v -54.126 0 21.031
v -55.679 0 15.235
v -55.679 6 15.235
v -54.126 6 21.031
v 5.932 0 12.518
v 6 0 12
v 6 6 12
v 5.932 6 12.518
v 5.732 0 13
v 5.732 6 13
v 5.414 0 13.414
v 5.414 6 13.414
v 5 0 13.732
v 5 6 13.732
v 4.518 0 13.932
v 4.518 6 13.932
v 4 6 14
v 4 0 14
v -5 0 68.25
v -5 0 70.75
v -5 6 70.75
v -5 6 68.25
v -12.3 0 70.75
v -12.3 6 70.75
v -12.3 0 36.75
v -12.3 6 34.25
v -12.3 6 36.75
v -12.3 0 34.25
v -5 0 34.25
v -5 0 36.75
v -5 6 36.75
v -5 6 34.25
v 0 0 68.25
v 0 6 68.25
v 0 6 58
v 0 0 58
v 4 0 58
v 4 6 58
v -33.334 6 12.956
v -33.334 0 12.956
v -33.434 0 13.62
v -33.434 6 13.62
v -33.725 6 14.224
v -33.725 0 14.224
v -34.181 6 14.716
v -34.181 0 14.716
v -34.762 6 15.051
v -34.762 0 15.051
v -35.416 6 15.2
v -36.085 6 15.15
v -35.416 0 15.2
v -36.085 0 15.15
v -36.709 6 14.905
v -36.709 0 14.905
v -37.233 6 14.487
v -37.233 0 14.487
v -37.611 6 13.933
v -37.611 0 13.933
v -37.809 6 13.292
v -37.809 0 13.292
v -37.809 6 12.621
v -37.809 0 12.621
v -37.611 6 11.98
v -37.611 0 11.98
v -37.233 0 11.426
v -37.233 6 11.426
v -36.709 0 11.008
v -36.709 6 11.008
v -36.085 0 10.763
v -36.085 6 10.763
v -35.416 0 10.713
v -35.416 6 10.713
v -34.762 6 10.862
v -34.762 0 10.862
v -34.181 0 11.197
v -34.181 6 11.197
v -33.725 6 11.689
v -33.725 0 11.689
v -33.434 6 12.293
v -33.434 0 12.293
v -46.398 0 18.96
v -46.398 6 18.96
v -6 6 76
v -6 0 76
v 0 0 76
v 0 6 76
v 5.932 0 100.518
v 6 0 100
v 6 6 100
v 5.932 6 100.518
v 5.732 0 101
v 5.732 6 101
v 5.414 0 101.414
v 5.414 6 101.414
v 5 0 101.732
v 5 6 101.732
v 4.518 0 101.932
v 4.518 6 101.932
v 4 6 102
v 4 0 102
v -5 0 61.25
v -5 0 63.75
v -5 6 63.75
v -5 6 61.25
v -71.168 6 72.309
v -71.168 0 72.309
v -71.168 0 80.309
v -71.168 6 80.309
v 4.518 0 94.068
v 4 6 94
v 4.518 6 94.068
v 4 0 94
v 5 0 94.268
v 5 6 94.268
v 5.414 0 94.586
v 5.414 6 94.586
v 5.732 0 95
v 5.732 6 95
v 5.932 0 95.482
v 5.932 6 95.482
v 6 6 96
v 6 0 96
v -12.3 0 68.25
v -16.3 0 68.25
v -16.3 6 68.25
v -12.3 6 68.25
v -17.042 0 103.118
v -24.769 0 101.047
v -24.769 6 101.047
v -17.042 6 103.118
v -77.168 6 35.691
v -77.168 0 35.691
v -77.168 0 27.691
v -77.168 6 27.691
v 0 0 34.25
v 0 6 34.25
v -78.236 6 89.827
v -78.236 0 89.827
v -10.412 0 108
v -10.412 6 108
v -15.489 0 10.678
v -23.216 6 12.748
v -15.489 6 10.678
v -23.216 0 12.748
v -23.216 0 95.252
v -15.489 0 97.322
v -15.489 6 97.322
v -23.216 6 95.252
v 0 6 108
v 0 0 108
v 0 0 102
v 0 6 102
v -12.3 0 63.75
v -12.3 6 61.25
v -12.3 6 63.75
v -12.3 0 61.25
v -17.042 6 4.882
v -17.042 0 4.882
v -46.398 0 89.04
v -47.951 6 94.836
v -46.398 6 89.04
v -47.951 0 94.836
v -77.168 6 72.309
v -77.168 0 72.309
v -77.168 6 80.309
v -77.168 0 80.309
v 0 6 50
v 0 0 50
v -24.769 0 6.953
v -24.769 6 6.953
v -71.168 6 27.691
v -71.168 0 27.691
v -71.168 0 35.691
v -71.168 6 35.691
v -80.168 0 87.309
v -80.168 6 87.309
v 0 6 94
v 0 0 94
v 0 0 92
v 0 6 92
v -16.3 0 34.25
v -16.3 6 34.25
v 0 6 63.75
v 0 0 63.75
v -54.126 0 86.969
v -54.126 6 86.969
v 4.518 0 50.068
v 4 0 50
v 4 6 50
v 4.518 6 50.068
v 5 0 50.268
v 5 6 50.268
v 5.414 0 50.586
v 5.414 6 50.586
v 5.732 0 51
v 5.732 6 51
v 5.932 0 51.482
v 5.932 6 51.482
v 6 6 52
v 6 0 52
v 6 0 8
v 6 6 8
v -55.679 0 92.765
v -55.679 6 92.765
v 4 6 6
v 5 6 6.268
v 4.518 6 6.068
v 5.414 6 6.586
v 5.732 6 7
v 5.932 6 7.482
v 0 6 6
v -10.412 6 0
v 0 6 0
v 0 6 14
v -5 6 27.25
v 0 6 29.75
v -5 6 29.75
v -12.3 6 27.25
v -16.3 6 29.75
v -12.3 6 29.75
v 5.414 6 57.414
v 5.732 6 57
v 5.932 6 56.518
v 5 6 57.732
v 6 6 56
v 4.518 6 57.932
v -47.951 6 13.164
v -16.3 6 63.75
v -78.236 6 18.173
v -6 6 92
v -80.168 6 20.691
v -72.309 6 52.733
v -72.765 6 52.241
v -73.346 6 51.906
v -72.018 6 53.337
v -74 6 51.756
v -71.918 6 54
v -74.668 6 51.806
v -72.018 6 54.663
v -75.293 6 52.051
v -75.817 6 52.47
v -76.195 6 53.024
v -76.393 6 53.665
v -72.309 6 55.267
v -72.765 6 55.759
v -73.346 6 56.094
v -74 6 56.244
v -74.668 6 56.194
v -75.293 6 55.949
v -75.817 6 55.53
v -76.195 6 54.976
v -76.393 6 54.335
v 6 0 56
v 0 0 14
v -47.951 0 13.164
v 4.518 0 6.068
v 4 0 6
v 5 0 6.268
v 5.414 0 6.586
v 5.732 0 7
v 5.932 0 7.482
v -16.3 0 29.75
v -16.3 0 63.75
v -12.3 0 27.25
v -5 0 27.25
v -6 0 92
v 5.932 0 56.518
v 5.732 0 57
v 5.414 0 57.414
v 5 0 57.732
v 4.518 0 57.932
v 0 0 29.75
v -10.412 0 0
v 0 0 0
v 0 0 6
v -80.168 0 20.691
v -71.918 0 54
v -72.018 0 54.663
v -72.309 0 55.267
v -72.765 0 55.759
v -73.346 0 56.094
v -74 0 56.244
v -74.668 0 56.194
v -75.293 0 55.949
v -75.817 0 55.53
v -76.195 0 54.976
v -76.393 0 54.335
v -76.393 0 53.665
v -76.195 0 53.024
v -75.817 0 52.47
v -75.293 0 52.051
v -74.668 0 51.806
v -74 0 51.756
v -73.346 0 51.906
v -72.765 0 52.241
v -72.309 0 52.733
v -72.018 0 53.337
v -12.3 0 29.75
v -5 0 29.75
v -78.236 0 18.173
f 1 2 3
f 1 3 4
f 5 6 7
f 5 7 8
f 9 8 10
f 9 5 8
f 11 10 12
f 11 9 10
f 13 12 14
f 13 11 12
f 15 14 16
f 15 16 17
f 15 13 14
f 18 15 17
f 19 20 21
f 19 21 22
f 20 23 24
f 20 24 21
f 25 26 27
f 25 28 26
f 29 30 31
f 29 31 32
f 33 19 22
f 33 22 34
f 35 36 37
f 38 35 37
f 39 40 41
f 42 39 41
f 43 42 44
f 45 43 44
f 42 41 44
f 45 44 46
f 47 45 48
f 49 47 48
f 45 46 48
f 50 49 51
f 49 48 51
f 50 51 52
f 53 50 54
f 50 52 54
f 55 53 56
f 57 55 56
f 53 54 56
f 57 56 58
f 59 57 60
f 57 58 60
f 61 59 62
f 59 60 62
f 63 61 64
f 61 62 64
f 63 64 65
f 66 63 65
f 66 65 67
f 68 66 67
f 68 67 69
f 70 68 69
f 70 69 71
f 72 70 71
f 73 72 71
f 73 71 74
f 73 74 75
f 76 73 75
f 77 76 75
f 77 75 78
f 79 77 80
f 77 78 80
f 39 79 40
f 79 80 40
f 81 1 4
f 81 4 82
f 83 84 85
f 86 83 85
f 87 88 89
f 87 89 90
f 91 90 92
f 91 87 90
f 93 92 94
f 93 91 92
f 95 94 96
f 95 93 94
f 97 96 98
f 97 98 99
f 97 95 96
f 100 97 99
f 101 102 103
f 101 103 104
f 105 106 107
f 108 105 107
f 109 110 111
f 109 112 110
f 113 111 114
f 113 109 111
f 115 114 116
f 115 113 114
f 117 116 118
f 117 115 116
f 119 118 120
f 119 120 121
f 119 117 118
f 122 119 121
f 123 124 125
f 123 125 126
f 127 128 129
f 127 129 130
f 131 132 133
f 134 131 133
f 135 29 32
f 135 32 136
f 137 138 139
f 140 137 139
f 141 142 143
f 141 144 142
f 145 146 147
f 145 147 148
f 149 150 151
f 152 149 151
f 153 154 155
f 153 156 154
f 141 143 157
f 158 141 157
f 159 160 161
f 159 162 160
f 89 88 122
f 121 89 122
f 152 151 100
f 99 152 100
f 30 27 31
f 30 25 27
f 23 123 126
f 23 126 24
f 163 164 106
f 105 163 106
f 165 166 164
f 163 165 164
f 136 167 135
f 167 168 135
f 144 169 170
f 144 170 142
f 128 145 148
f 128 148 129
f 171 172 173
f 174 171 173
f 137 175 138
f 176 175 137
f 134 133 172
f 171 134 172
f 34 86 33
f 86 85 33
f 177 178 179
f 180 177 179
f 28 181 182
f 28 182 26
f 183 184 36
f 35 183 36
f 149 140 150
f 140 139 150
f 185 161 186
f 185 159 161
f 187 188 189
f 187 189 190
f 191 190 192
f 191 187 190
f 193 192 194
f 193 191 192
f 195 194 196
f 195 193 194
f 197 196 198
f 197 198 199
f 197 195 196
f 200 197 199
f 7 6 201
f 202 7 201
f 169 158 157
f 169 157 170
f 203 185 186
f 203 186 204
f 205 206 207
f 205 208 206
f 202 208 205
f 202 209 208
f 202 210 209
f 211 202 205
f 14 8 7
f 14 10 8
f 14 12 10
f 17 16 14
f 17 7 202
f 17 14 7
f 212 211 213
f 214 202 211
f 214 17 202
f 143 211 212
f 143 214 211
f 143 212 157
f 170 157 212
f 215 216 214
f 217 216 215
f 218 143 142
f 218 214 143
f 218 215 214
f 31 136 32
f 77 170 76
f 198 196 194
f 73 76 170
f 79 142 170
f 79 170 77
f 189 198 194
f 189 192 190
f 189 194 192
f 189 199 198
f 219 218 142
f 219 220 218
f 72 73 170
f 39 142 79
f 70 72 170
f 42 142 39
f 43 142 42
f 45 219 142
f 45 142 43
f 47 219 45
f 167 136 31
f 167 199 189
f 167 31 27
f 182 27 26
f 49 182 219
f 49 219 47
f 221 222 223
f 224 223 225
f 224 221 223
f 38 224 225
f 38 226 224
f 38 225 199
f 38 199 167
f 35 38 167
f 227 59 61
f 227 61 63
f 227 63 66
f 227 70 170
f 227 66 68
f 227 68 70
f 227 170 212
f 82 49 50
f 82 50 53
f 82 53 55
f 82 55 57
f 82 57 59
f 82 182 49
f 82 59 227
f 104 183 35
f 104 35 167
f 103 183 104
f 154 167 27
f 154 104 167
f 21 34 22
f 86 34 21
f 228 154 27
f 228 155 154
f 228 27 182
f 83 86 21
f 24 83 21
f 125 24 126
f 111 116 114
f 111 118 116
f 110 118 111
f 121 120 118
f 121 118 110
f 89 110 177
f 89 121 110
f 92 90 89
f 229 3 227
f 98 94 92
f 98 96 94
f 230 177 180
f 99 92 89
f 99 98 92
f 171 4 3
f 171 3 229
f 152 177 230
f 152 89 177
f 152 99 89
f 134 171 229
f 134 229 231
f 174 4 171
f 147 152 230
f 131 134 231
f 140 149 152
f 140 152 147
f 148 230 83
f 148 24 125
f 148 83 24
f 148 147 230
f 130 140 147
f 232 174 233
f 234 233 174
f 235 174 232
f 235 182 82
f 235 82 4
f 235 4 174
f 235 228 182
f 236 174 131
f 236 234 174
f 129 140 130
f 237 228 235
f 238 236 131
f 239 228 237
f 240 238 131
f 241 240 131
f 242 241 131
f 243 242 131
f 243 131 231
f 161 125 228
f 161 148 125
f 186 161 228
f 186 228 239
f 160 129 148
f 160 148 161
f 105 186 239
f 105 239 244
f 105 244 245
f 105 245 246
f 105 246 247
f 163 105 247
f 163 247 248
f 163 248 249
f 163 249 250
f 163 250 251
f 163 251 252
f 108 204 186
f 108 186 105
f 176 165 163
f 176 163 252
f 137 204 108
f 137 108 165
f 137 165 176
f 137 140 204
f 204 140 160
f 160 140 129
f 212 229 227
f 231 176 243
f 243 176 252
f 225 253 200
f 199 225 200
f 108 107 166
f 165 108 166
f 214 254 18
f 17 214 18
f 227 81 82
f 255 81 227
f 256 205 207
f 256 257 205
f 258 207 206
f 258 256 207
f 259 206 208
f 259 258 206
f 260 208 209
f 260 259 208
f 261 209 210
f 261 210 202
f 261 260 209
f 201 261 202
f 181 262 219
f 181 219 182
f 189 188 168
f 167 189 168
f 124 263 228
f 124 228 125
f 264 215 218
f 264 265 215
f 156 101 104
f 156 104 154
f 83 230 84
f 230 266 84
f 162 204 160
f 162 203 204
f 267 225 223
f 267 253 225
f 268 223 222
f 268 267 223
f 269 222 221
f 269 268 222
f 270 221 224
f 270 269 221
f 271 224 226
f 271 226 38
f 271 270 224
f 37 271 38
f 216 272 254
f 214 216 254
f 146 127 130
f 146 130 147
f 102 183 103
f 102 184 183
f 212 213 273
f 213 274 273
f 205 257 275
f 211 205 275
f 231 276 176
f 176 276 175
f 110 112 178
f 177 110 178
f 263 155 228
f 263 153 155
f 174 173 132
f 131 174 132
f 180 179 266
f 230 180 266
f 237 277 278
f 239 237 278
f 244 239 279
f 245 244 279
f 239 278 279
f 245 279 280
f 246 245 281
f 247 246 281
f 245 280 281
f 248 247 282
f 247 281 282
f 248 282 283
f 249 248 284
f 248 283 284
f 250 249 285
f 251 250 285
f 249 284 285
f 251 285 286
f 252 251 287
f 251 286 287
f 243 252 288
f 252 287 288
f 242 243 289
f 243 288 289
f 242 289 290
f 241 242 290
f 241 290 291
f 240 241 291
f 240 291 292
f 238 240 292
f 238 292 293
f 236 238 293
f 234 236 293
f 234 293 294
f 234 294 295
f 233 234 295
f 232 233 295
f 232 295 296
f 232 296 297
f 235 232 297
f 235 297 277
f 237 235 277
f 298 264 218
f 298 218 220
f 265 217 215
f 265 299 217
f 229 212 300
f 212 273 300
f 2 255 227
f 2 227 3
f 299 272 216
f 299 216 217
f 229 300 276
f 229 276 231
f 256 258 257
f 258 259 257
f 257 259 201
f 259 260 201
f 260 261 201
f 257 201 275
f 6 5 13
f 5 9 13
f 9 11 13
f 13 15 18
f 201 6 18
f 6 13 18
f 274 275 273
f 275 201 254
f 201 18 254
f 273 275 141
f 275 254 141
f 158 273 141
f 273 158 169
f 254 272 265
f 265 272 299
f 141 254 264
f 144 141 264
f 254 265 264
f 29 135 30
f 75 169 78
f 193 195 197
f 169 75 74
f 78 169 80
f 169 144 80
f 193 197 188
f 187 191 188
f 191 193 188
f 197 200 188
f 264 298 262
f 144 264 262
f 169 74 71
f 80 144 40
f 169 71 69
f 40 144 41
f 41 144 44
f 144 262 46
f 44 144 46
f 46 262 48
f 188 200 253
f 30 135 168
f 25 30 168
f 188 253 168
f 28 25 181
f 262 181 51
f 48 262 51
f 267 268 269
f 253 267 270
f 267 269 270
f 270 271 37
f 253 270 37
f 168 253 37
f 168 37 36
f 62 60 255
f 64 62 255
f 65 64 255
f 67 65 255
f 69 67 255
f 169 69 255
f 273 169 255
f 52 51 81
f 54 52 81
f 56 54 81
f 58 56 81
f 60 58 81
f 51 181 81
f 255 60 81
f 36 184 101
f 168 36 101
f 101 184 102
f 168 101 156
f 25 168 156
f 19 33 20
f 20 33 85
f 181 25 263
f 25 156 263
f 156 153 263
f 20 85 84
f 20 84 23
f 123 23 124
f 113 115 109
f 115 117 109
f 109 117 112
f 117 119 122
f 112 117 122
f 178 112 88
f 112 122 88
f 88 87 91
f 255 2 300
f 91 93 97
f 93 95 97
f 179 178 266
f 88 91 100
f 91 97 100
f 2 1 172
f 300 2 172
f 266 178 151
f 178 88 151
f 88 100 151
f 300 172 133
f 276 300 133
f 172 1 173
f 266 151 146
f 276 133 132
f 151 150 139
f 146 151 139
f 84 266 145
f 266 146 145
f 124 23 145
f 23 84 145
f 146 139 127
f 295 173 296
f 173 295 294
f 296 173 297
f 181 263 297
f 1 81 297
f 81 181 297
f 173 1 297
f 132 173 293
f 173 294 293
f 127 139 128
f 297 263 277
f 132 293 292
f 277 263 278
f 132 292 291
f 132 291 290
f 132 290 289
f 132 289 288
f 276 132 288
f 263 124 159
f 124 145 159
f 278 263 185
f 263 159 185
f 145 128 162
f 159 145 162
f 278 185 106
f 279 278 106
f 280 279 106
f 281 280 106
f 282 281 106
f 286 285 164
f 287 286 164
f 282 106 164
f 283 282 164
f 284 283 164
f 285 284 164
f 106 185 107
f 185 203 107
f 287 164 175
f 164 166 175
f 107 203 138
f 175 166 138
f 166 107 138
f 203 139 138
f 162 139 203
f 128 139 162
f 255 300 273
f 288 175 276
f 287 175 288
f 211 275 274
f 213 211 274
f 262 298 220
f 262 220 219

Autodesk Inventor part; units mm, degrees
ref_plane "YZ Plane" through (0, 0, 0) normal (1, 0, 0) x (0, 1, 0)
ref_plane "XZ Plane" through (0, 0, 0) normal (0, 1, 0) x (-1, 0, 0)
ref_plane "XY Plane" through (0, 0, 0) normal (0, 0, 1) x (1, 0, 0)
sketch "Sketch1" plane through (0, 0, 0) normal (0, 1, 0) x (-1, 0, 0)
  line L0 (0, 108) -> (0, 0)
  line L1 (0, 0) -> (10.412, 0)
  line L2 (10.412, 0) -> (80.1677, 18.691)
  line L3 (80.1677, 18.691) -> (80.1677, 89.309)
  line L4 (80.1677, 89.309) -> (10.412, 108)
  line L5 (10.412, 108) -> (0, 108)
  line L6 (2.5529, 107) -> (1, 101.2044) construction
  line L7 (1, 101.2044) -> (68.6148, 83.0871) construction
  line L8 (68.6148, 83.0871) -> (70.1677, 88.8827) construction
  line L9 (70.1677, 88.8827) -> (2.5529, 107) construction
  line L10 (1, 6.7956) -> (2.5529, 1) construction
  line L11 (2.5529, 1) -> (70.1677, 19.1173) construction
  line L12 (70.1677, 19.1173) -> (68.6148, 24.9129) construction
  line L13 (68.6148, 24.9129) -> (1, 6.7956) construction
  line L14 (71.1677, 88.309) -> (77.1677, 88.309) construction
  line L15 (77.1677, 88.309) -> (77.1677, 19.691) construction
  line L16 (77.1677, 19.691) -> (71.1677, 19.691) construction
  line L17 (71.1677, 19.691) -> (71.1677, 88.309) construction
  line L18 (17.0418, 103.1177) -> (15.4889, 97.3222)
  line L19 (15.4889, 97.3222) -> (23.2163, 95.2516)
  line L20 (23.2163, 95.2516) -> (24.7692, 101.0472)
  line L21 (24.7692, 101.0472) -> (17.0418, 103.1177)
  line L22 (47.9514, 94.8355) -> (46.3985, 89.0399)
  line L23 (46.3985, 89.0399) -> (54.1259, 86.9694)
  line L24 (54.1259, 86.9694) -> (55.6788, 92.765)
  line L25 (55.6788, 92.765) -> (47.9514, 94.8355)
  line L26 (15.4889, 10.6778) -> (17.0418, 4.8823)
  line L27 (17.0418, 4.8823) -> (24.7692, 6.9528)
  line L28 (24.7692, 6.9528) -> (23.2163, 12.7484)
  line L29 (23.2163, 12.7484) -> (15.4889, 10.6778)
  line L30 (46.3985, 18.9601) -> (47.9514, 13.1645)
  line L31 (47.9514, 13.1645) -> (55.6788, 15.235)
  line L32 (55.6788, 15.235) -> (54.1259, 21.0306)
  line L33 (54.1259, 21.0306) -> (46.3985, 18.9601)
  line L34 (54.9024, 89.8672) -> (69.3913, 85.9849) construction
  line L35 (16.2653, 7.7801) -> (1.7765, 3.8978) construction
  line L36 (54.9024, 18.1328) -> (69.3913, 22.0151) construction
  line L37 (16.2653, 100.2199) -> (1.7765, 104.1022) construction
  line L38 (71.1677, 80.309) -> (77.1677, 80.309)
  line L39 (77.1677, 80.309) -> (77.1677, 72.309)
  line L40 (77.1677, 72.309) -> (71.1677, 72.309)
  line L41 (71.1677, 72.309) -> (71.1677, 80.309)
  line L42 (71.1677, 35.691) -> (77.1677, 35.691)
  line L43 (77.1677, 35.691) -> (77.1677, 27.691)
  line L44 (77.1677, 27.691) -> (71.1677, 27.691)
  line L45 (71.1677, 27.691) -> (71.1677, 35.691)
  line L46 (74.1677, 80.309) -> (74.1677, 88.309) construction
  line L47 (74.1677, 27.691) -> (74.1677, 19.691) construction
  dimension "d0" = 70
  dimension "d1" = 6
  dimension "d3" = 70
  dimension "d4" = 6
  dimension "d7" = 3
  dimension "d8" = 3
  dimension "d9" = 6
  dimension "d10" = 3
  dimension "d11" = 1
  dimension "d12" = 1
  dimension "d13" = 1
  dimension "d14" = 1
  dimension "d15" = 15
  dimension "d16" = 1
  dimension "d17" = 1
  dimension "d18" = 1
  dimension "d19" = 108
  dimension "d20" = 8
  dimension "d21" = 15
  dimension "d22" = 8
extrude "Extrusion7" add sketch "Sketch1" along normal blind 6
sketch "Sketch7" plane through (0, 0, 0) normal (0, -1, 0) x (1, 0, 0)
  line L0 (0, 0) -> (0, 108) projected
  line L1 (0, 92) -> (-6, 92)
  line L2 (-6, 92) -> (-6, 76)
  line L3 (-6, 76) -> (0, 76)
  line L4 (0, 76) -> (0, 92)
  dimension "d74" = 16
  dimension "d75" = 16
  dimension "d76" = 6
extrude "Extrusion8" cut sketch "Sketch7" against normal blind 6
sketch "Sketch8" plane through (0, 0, 0) normal (0, -1, 0) x (1, 0, 0)
  line L0 (-77.1677, 72.309) -> (-71.1677, 35.691) construction
  line L1 (-77.1677, 35.691) -> (-71.1677, 72.309) construction
  circle A0 centre (-74.1677, 54) radius 2.25
  dimension "d80" = 4.5
extrude "Extrusion9" cut sketch "Sketch8" against normal blind 6
sketch "Sketch9" plane through (0, 0, 0) normal (0, -1, 0) x (1, 0, 0)
  line L0 (-46.3985, 18.9601) -> (-24.7692, 6.9528) construction
  line L1 (-23.2163, 12.7484) -> (-47.9514, 13.1645) construction
  circle A0 centre (-35.5839, 12.9564) radius 2.25
  dimension "d83" = 4.5
extrude "Extrusion10" cut sketch "Sketch9" against normal blind 6
sketch "Sketch10" plane through (0, 0, 0) normal (0, -1, 0) x (1, 0, 0)
  line L0 (0, 0) -> (0, 76) projected
  line L1 (0, 68.25) -> (0, 63.75)
  line L2 (-16.3, 63.75) -> (-16.3, 68.25)
  line L3 (-12.3, 70.75) -> (-5, 70.75)
  line L4 (-5, 61.25) -> (-12.3, 61.25)
  line L5 (-16.3, 68.25) -> (-12.3, 68.25)
  line L6 (-5, 68.25) -> (0, 68.25)
  line L7 (0, 63.75) -> (-5, 63.75)
  line L8 (-12.3, 63.75) -> (-16.3, 63.75)
  line L9 (-12.3, 61.25) -> (-12.3, 63.75)
  line L10 (-12.3, 68.25) -> (-12.3, 70.75)
  line L11 (-5, 70.75) -> (-5, 68.25)
  line L12 (-5, 63.75) -> (-5, 61.25)
  line L13 (0, 34.25) -> (0, 29.75)
  line L14 (-16.3, 29.75) -> (-16.3, 34.25)
  line L15 (-12.3, 36.75) -> (-5, 36.75)
  line L16 (-5, 27.25) -> (-12.3, 27.25)
  line L17 (-16.3, 34.25) -> (-12.3, 34.25)
  line L18 (-5, 34.25) -> (0, 34.25)
  line L19 (0, 29.75) -> (-5, 29.75)
  line L20 (-12.3, 29.75) -> (-16.3, 29.75)
  line L21 (-12.3, 27.25) -> (-12.3, 29.75)
  line L22 (-12.3, 34.25) -> (-12.3, 36.75)
  line L23 (-5, 36.75) -> (-5, 34.25)
  line L24 (-5, 29.75) -> (-5, 27.25)
  point P0 (0, 108)
  point P1 (-16.3, 66)
  point P2 (-16.3, 32)
  dimension "d86" = 4.5
  dimension "d87" = 2.5
  dimension "d88" = 2.5
  dimension "d89" = 5
  dimension "d90" = 7.3
  dimension "d91" = 4
  dimension "d92" = 4.5
  dimension "d93" = 2.5
  dimension "d94" = 2.5
  dimension "d95" = 5
  dimension "d96" = 7.3
  dimension "d97" = 4
  dimension "d98" = 42
  dimension "d99" = 34
extrude "Extrusion11" cut sketch "Sketch10" against normal blind 6
chamfer "Chamfer2" distance 2 angle 45 2 edges at (-80.1677, 3, 89.309) (-80.1677, 3, 18.691)
sketch "Sketch11" plane through (0, 0, 0) normal (0, -1, 0) x (1, 0, 0)
  line L0 (0, 0) -> (0, 29.75) projected
  line L1 (0, 34.25) -> (0, 63.75) projected
  line L2 (0, 92) -> (0, 108) projected
  line L3 (0, 108) -> (-10.412, 108) projected
  line L4 (0, 102) -> (4, 102)
  line L5 (6, 100) -> (6, 96)
  line L6 (4, 94) -> (0, 94)
  line L7 (0, 94) -> (0, 102)
  line L8 (0, 58) -> (4, 58)
  line L9 (6, 56) -> (6, 52)
  line L10 (4, 50) -> (0, 50)
  line L11 (0, 50) -> (0, 58)
  line L12 (0, 14) -> (4, 14)
  line L13 (6, 12) -> (6, 8)
  line L14 (4, 6) -> (0, 6)
  line L15 (0, 6) -> (0, 14)
  arc A0 (6, 100) -> (4, 102) centre (4, 100) ccw
  arc A1 (4, 94) -> (6, 96) centre (4, 96) ccw
  arc A2 (6, 56) -> (4, 58) centre (4, 56) ccw
  arc A3 (4, 50) -> (6, 52) centre (4, 52) ccw
  arc A4 (6, 12) -> (4, 14) centre (4, 12) ccw
  arc A5 (4, 6) -> (6, 8) centre (4, 8) ccw
  dimension "d105" = 2
  dimension "d106" = 8
  dimension "d107" = 8
  dimension "d108" = 8
  dimension "d109" = 6
  dimension "d110" = 6
  dimension "d111" = 36
  dimension "d112" = 36
extrude "Extrusion12" add sketch "Sketch11" against normal blind 6
equation "\"d3\" = d0"
equation "\"d4\" = d1"
equation "\"d8\" = d7"
equation "\"d9\" = d1"
equation "\"d10\" = d7"
equation "\"d12\" = d11"
equation "\"d88\" = d87"
equation "\"d94\" = d93"
properties part number "front_panel_2004_brace_right"
